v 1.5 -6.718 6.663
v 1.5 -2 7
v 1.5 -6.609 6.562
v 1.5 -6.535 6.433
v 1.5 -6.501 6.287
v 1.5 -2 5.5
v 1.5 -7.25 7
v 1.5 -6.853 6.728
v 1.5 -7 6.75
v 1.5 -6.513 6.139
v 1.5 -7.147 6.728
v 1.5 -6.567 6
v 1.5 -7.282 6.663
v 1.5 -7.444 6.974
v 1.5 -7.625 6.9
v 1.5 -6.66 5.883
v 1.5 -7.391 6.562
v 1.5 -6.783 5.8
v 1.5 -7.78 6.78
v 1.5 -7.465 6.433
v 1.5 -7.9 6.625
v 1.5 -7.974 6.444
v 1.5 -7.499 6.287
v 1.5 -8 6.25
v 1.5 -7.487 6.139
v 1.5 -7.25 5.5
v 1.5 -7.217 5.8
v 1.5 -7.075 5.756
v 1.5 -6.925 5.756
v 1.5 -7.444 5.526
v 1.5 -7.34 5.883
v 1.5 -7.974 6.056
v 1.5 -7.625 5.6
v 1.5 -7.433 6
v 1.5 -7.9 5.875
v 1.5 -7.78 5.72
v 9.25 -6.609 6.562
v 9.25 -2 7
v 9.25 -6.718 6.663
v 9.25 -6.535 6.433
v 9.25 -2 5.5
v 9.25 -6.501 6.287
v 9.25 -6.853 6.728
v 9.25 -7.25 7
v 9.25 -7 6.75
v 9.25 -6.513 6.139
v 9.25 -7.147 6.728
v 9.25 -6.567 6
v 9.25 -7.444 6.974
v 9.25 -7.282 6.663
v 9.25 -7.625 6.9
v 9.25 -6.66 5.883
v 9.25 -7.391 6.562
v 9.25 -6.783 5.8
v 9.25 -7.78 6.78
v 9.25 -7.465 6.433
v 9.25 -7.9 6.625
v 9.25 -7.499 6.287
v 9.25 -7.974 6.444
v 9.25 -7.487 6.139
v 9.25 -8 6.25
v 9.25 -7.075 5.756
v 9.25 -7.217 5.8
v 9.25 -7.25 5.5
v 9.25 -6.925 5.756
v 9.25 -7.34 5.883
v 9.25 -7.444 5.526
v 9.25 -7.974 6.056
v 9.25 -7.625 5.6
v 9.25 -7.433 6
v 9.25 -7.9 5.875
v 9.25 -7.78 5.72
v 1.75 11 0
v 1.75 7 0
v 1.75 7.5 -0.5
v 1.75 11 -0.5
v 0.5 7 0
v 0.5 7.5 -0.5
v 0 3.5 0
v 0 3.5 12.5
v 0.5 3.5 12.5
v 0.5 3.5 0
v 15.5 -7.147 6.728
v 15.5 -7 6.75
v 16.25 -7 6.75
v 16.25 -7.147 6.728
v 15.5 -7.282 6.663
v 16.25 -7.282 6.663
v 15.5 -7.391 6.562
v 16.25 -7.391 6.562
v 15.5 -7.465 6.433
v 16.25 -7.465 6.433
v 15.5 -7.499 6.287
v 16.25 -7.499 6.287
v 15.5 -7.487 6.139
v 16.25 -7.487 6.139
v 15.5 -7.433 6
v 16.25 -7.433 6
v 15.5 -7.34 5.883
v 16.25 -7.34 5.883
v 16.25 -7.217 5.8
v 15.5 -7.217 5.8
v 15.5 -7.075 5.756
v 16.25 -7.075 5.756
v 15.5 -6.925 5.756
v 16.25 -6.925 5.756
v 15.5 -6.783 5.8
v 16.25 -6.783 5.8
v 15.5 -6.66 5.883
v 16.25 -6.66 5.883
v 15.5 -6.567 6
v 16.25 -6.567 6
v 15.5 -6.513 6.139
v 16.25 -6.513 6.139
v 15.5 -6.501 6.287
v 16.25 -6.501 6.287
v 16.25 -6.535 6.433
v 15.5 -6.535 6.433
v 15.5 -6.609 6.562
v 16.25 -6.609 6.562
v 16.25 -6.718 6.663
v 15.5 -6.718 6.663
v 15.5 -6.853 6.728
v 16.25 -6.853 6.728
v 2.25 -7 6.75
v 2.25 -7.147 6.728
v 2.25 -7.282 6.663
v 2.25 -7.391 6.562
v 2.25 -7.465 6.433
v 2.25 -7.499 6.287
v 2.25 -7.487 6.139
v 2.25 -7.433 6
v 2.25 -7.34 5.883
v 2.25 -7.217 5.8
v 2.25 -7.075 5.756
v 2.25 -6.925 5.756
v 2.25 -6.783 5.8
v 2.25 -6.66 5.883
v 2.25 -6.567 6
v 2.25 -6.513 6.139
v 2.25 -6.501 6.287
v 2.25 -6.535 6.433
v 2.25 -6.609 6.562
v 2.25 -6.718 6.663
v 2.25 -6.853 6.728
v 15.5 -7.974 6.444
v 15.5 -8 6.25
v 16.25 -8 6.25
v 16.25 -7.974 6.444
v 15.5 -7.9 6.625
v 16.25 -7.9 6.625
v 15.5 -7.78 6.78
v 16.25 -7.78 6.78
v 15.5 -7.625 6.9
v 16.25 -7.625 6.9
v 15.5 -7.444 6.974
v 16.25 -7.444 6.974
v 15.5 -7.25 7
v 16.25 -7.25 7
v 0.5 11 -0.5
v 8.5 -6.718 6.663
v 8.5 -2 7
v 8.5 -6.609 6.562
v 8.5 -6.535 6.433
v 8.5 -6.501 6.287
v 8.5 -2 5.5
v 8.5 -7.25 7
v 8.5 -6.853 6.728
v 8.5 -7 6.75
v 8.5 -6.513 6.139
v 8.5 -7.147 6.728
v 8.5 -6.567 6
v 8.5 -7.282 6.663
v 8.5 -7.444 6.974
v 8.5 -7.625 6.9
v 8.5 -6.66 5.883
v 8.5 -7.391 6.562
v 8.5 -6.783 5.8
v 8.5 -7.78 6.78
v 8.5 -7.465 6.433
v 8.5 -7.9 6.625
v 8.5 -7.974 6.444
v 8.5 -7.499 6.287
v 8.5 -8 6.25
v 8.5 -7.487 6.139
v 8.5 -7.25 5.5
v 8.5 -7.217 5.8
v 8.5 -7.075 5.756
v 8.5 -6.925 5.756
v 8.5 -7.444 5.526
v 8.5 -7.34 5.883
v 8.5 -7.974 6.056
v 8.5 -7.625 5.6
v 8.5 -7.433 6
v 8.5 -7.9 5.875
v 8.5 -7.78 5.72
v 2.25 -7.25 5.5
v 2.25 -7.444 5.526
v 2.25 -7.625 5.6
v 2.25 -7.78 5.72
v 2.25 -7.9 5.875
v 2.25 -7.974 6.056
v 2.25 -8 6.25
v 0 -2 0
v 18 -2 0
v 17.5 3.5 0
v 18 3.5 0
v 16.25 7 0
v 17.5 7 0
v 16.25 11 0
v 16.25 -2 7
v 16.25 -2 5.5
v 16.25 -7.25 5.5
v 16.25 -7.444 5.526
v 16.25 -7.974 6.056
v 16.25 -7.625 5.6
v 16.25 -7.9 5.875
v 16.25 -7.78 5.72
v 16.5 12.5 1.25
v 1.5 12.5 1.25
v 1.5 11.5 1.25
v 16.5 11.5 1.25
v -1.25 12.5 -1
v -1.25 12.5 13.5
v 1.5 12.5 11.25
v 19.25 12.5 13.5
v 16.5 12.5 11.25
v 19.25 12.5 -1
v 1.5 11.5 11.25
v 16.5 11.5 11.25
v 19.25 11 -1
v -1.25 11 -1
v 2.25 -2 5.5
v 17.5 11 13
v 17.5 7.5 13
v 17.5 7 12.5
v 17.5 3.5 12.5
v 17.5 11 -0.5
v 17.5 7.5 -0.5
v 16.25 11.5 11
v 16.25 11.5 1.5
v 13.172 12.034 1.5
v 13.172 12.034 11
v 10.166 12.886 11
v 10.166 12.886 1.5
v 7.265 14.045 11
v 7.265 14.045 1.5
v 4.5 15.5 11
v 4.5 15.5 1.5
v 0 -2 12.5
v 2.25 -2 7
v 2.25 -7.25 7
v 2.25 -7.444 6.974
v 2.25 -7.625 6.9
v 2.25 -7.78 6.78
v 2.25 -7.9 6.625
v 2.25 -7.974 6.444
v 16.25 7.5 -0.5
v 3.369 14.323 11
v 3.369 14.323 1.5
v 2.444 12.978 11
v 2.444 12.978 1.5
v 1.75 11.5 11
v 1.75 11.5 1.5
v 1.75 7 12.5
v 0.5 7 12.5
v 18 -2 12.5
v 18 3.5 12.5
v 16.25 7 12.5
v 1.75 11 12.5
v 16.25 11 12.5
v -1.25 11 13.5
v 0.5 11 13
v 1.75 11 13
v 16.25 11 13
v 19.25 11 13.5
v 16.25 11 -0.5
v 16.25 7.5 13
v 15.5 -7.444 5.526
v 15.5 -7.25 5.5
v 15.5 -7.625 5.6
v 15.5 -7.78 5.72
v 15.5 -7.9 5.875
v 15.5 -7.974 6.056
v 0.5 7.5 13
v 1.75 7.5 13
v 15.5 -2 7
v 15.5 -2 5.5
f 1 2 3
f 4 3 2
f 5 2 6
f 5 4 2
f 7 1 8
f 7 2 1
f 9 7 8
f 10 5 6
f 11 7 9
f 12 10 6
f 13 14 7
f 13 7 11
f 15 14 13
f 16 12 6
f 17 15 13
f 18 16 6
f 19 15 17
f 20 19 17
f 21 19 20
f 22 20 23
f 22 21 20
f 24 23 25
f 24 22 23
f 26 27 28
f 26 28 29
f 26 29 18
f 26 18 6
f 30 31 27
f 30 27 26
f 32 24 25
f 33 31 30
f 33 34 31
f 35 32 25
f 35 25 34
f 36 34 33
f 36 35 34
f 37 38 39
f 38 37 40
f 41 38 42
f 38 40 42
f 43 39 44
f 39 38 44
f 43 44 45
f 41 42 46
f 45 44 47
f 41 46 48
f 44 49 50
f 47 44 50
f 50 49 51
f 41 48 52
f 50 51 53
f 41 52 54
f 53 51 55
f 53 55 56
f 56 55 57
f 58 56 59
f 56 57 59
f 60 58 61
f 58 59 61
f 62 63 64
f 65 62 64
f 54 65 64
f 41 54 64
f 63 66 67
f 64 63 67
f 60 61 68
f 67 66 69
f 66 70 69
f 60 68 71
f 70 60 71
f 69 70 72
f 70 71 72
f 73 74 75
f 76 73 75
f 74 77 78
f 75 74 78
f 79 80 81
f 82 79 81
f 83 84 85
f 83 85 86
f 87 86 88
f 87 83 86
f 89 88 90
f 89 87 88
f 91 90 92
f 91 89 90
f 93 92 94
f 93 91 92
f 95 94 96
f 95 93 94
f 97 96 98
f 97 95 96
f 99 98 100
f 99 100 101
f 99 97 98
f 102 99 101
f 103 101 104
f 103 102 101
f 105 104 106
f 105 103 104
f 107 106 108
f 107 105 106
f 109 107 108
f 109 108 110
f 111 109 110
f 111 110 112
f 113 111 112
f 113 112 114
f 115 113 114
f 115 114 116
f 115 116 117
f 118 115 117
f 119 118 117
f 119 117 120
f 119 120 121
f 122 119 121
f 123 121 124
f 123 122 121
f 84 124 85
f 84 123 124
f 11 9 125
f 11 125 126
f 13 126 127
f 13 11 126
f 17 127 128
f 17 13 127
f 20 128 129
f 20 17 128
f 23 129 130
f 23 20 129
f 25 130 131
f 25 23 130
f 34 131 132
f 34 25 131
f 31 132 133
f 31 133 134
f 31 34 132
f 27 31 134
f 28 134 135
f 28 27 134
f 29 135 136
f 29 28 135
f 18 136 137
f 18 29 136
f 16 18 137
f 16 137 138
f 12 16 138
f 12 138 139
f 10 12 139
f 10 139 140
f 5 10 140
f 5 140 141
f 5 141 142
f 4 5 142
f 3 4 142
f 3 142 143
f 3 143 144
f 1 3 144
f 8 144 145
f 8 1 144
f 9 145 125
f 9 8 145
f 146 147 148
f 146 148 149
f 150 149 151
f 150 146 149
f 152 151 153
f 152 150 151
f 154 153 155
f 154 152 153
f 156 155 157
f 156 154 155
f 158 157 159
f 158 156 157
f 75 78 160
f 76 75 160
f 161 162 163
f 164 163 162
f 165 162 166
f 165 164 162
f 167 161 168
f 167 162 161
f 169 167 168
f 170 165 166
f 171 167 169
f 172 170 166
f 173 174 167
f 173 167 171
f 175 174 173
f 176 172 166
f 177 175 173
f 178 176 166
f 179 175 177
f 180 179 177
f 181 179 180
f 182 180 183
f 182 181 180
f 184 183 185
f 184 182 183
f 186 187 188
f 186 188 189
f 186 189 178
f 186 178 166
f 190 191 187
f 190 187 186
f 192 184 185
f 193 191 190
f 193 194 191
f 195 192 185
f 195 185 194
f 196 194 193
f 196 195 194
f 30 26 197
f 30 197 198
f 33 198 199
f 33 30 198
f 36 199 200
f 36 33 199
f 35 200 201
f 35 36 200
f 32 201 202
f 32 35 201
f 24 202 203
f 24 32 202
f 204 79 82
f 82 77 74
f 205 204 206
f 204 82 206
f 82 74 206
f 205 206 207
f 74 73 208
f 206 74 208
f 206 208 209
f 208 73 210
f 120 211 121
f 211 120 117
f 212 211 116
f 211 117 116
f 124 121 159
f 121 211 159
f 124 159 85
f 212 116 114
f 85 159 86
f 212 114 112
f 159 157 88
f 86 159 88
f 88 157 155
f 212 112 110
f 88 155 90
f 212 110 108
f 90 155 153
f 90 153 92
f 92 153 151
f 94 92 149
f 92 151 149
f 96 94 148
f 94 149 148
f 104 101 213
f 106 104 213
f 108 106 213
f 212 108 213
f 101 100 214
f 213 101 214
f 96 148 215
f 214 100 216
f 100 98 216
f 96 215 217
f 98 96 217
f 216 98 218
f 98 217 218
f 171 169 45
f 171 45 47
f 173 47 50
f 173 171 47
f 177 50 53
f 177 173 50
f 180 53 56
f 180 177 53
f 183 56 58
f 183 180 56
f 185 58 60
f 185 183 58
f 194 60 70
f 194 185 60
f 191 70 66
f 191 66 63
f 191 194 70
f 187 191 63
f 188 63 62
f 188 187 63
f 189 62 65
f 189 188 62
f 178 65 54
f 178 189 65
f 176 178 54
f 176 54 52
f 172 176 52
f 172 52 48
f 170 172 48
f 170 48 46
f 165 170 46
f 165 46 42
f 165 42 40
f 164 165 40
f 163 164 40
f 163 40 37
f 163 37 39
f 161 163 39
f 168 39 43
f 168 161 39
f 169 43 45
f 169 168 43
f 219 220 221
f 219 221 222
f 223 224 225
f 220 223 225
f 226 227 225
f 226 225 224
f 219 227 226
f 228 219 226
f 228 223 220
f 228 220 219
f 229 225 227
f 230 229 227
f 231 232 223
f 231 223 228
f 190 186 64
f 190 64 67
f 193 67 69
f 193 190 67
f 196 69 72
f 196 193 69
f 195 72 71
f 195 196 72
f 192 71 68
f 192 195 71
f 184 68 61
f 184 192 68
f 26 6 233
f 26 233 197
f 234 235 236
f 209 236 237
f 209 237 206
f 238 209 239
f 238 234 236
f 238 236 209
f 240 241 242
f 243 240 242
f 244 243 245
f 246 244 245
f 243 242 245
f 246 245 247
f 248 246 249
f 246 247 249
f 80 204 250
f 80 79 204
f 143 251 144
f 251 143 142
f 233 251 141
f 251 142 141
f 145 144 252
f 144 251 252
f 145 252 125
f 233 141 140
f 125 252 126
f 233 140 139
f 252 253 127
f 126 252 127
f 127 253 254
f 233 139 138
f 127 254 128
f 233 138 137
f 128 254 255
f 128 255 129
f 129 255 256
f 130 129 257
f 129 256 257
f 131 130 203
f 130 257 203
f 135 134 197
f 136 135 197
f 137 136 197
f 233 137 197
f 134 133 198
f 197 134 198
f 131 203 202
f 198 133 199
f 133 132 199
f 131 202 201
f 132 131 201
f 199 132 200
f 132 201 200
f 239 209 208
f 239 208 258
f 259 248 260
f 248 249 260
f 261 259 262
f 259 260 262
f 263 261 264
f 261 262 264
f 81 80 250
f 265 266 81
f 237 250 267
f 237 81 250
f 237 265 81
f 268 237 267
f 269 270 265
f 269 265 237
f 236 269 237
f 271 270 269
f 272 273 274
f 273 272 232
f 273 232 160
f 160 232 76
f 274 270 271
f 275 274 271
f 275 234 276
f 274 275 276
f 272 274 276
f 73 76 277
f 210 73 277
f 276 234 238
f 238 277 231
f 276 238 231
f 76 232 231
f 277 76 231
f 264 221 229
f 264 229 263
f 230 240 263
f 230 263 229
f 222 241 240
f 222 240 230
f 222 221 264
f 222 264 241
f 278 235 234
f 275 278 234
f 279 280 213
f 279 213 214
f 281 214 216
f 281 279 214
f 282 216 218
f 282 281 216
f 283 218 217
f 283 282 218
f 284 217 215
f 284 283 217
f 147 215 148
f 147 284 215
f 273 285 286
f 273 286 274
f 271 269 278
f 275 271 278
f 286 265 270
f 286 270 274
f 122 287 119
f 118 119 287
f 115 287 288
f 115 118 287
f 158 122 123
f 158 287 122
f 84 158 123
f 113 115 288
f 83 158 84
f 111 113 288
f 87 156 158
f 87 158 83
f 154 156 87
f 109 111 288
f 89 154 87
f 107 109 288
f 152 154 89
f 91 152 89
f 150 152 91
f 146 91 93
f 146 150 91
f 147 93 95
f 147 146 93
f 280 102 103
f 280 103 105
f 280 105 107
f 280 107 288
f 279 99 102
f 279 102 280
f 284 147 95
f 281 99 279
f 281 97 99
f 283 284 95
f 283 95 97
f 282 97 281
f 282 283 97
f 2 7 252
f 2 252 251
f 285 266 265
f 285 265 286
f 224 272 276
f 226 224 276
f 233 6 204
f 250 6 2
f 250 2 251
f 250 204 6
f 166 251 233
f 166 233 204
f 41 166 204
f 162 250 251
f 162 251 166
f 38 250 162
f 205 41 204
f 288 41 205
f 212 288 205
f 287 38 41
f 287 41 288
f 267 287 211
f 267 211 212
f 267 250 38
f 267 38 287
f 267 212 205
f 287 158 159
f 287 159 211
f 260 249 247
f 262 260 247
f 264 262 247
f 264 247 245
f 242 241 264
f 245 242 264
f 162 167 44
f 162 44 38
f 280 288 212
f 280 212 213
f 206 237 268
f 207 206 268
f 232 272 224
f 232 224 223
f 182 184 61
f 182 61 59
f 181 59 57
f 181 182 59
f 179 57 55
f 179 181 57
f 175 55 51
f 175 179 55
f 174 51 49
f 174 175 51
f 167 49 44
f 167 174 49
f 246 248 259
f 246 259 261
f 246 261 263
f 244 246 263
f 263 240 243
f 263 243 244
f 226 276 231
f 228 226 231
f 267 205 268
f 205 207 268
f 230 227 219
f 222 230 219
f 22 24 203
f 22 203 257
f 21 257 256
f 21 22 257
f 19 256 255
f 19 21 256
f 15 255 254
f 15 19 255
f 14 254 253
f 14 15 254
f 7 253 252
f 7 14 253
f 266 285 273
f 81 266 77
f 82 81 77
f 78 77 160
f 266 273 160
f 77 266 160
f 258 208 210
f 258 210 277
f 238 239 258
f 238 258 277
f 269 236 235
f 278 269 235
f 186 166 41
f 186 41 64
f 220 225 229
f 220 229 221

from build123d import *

# Parameters (mm, degrees)
SKETCH_1_W             = 18
SKETCH_1_H             = 11
EXTRUDE_1_DEPTH        = 12.5
SKETCH_2_W             = 20.5
SKETCH_2_H             = 14.5
EXTRUDE_2_DEPTH        = 1.5
SKETCH_3_W             = 0.5
SKETCH_3_H             = 7.5
CUT_EXTRUDE_2_DEPTH    = 14.5
EXTRUDE_3_DEPTH        = 1.25
MIRROR_2_COPY_1_DEPTH  = 1.25
SKETCH_7_W             = 18
SKETCH_7_H             = 12.5
EXTRUDE_4_DEPTH        = 2
SKETCH_8_W             = 15
SKETCH_8_H             = 10
CUT_EXTRUDE_3_DEPTH    = 1
EXTRUDE_5_DEPTH        = 4.75
EXTRUDE_5_DEPTH_BACK   = 4.75
SKETCH_11_R            = 0.5
EXTRUDE_6_DEPTH        = 0.75
PATTERN_LINEAR_1_COUNT = 3
PATTERN_LINEAR_1_PITCH = 7


with BuildPart() as part:
    # Эскиз1 → Бобышка-Вытянуть1 (new body)
    with BuildSketch(Plane.XY):
        with Locations((9, 5.5)):
            Rectangle(SKETCH_1_W, SKETCH_1_H)
    extrude(amount=EXTRUDE_1_DEPTH)

    # Эскиз2 → Бобышка-Вытянуть2 (add)
    with BuildSketch(Plane(origin=(0, 11, 0), x_dir=(1, 0, 0), z_dir=(0, 1, 0))):
        with Locations((9, -6.25)):
            Rectangle(SKETCH_2_W, SKETCH_2_H)
    extrude(amount=EXTRUDE_2_DEPTH)

    # Эскиз3 → Вырез-Вытянуть2 (cut, through all)
    with BuildSketch(Plane.XY.offset(12.5)):
        with Locations((17.75, 7.25)):
            Rectangle(SKETCH_3_W, SKETCH_3_H)
        with Locations((0.25, 7.25)):
            Rectangle(SKETCH_3_W, SKETCH_3_H)
    extrude(amount=-CUT_EXTRUDE_2_DEPTH, mode=Mode.SUBTRACT)

    # Эскиз4 → Бобышка-Вытянуть3 (add)
    with BuildSketch(Plane(origin=(17.5, 0, 0), x_dir=(0, 0, -1), z_dir=(1, 0, 0))):
        Polygon((-12.5, 7), (-13, 7.5), (-13, 11), (-12.5, 11), align=None)
    extrude_3 = extrude(amount=-EXTRUDE_3_DEPTH)

    # Зеркальное отражение1: Бобышка-Вытянуть3 across plane
    add(extrude_3.mirror(Plane(origin=(0, 0, 6.25), x_dir=(1, 0, 0), z_dir=(0, 0, -1))))

    # Зеркальное отражение2: Бобышка-Вытянуть3 across plane
    add(extrude_3.mirror(Plane.ZY.offset(-9)))

    # Зеркальное отражение2 copy 1 sketch → Зеркальное отражение2 copy 1 (add)
    with BuildSketch(Plane(origin=(0.5, 0, 12.5), x_dir=(0, 0, 1), z_dir=(-1, 0, 0))):
        Polygon((-12.5, 7), (-13, 7.5), (-13, 11), (-12.5, 11), align=None)
    extrude(amount=-MIRROR_2_COPY_1_DEPTH)

    # Эскиз7 → Бобышка-Вытянуть4 (add)
    with BuildSketch(Plane.XZ):
        with Locations((9, 6.25)):
            Rectangle(SKETCH_7_W, SKETCH_7_H)
    extrude(amount=EXTRUDE_4_DEPTH)

    # Эскиз8 → Вырез-Вытянуть3 (cut)
    with BuildSketch(Plane(origin=(0, 12.5, 0), x_dir=(1, 0, 0), z_dir=(0, 1, 0))):
        with Locations((9, -6.25)):
            Rectangle(SKETCH_8_W, SKETCH_8_H)
    extrude(amount=-CUT_EXTRUDE_3_DEPTH, mode=Mode.SUBTRACT)

    # Эскиз9 → Бобышка-Вытянуть5 (add, two sides)
    with BuildSketch(Plane.YX.offset(-6.25)) as extrude_5_sk:
        with BuildLine():
            Line((11.5, 1.75), (11.5, 16.25))
            ThreePointArc((11.5, 16.25), (12.885675396, 10.16586822), (15.5, 4.5))
            ThreePointArc((15.5, 4.5), (13.669392877, 2.87861036), (11.5, 1.75))
        make_face()
    extrude(amount=EXTRUDE_5_DEPTH)
    extrude(extrude_5_sk.sketch, amount=-EXTRUDE_5_DEPTH_BACK)

    # Эскиз11 → Бобышка-Вытянуть6 (add)
    with BuildSketch(Plane(origin=(1.5, 0, 0), x_dir=(0, 0, 1), z_dir=(1, 0, 0))):
        with BuildLine():
            Line((5.5, 2), (5.5, 7.25))
            ThreePointArc((5.5, 7.25), (5.719669914, 7.780330086), (6.25, 8))
            ThreePointArc((6.25, 8), (6.780330086, 7.780330086), (7, 7.25))
            Line((7, 7.25), (7, 2))
            Line((7, 2), (5.5, 2))
        make_face()
        with Locations((6.25, 7)):
            Circle(SKETCH_11_R, mode=Mode.SUBTRACT)
    extrude_6 = extrude(amount=EXTRUDE_6_DEPTH)

    # Линейный массив1: Бобышка-Вытянуть6 ×3
    with Locations(*[(i * PATTERN_LINEAR_1_PITCH, 0, 0) for i in range(1, PATTERN_LINEAR_1_COUNT)]):
        add(extrude_6)


solid = part.part
